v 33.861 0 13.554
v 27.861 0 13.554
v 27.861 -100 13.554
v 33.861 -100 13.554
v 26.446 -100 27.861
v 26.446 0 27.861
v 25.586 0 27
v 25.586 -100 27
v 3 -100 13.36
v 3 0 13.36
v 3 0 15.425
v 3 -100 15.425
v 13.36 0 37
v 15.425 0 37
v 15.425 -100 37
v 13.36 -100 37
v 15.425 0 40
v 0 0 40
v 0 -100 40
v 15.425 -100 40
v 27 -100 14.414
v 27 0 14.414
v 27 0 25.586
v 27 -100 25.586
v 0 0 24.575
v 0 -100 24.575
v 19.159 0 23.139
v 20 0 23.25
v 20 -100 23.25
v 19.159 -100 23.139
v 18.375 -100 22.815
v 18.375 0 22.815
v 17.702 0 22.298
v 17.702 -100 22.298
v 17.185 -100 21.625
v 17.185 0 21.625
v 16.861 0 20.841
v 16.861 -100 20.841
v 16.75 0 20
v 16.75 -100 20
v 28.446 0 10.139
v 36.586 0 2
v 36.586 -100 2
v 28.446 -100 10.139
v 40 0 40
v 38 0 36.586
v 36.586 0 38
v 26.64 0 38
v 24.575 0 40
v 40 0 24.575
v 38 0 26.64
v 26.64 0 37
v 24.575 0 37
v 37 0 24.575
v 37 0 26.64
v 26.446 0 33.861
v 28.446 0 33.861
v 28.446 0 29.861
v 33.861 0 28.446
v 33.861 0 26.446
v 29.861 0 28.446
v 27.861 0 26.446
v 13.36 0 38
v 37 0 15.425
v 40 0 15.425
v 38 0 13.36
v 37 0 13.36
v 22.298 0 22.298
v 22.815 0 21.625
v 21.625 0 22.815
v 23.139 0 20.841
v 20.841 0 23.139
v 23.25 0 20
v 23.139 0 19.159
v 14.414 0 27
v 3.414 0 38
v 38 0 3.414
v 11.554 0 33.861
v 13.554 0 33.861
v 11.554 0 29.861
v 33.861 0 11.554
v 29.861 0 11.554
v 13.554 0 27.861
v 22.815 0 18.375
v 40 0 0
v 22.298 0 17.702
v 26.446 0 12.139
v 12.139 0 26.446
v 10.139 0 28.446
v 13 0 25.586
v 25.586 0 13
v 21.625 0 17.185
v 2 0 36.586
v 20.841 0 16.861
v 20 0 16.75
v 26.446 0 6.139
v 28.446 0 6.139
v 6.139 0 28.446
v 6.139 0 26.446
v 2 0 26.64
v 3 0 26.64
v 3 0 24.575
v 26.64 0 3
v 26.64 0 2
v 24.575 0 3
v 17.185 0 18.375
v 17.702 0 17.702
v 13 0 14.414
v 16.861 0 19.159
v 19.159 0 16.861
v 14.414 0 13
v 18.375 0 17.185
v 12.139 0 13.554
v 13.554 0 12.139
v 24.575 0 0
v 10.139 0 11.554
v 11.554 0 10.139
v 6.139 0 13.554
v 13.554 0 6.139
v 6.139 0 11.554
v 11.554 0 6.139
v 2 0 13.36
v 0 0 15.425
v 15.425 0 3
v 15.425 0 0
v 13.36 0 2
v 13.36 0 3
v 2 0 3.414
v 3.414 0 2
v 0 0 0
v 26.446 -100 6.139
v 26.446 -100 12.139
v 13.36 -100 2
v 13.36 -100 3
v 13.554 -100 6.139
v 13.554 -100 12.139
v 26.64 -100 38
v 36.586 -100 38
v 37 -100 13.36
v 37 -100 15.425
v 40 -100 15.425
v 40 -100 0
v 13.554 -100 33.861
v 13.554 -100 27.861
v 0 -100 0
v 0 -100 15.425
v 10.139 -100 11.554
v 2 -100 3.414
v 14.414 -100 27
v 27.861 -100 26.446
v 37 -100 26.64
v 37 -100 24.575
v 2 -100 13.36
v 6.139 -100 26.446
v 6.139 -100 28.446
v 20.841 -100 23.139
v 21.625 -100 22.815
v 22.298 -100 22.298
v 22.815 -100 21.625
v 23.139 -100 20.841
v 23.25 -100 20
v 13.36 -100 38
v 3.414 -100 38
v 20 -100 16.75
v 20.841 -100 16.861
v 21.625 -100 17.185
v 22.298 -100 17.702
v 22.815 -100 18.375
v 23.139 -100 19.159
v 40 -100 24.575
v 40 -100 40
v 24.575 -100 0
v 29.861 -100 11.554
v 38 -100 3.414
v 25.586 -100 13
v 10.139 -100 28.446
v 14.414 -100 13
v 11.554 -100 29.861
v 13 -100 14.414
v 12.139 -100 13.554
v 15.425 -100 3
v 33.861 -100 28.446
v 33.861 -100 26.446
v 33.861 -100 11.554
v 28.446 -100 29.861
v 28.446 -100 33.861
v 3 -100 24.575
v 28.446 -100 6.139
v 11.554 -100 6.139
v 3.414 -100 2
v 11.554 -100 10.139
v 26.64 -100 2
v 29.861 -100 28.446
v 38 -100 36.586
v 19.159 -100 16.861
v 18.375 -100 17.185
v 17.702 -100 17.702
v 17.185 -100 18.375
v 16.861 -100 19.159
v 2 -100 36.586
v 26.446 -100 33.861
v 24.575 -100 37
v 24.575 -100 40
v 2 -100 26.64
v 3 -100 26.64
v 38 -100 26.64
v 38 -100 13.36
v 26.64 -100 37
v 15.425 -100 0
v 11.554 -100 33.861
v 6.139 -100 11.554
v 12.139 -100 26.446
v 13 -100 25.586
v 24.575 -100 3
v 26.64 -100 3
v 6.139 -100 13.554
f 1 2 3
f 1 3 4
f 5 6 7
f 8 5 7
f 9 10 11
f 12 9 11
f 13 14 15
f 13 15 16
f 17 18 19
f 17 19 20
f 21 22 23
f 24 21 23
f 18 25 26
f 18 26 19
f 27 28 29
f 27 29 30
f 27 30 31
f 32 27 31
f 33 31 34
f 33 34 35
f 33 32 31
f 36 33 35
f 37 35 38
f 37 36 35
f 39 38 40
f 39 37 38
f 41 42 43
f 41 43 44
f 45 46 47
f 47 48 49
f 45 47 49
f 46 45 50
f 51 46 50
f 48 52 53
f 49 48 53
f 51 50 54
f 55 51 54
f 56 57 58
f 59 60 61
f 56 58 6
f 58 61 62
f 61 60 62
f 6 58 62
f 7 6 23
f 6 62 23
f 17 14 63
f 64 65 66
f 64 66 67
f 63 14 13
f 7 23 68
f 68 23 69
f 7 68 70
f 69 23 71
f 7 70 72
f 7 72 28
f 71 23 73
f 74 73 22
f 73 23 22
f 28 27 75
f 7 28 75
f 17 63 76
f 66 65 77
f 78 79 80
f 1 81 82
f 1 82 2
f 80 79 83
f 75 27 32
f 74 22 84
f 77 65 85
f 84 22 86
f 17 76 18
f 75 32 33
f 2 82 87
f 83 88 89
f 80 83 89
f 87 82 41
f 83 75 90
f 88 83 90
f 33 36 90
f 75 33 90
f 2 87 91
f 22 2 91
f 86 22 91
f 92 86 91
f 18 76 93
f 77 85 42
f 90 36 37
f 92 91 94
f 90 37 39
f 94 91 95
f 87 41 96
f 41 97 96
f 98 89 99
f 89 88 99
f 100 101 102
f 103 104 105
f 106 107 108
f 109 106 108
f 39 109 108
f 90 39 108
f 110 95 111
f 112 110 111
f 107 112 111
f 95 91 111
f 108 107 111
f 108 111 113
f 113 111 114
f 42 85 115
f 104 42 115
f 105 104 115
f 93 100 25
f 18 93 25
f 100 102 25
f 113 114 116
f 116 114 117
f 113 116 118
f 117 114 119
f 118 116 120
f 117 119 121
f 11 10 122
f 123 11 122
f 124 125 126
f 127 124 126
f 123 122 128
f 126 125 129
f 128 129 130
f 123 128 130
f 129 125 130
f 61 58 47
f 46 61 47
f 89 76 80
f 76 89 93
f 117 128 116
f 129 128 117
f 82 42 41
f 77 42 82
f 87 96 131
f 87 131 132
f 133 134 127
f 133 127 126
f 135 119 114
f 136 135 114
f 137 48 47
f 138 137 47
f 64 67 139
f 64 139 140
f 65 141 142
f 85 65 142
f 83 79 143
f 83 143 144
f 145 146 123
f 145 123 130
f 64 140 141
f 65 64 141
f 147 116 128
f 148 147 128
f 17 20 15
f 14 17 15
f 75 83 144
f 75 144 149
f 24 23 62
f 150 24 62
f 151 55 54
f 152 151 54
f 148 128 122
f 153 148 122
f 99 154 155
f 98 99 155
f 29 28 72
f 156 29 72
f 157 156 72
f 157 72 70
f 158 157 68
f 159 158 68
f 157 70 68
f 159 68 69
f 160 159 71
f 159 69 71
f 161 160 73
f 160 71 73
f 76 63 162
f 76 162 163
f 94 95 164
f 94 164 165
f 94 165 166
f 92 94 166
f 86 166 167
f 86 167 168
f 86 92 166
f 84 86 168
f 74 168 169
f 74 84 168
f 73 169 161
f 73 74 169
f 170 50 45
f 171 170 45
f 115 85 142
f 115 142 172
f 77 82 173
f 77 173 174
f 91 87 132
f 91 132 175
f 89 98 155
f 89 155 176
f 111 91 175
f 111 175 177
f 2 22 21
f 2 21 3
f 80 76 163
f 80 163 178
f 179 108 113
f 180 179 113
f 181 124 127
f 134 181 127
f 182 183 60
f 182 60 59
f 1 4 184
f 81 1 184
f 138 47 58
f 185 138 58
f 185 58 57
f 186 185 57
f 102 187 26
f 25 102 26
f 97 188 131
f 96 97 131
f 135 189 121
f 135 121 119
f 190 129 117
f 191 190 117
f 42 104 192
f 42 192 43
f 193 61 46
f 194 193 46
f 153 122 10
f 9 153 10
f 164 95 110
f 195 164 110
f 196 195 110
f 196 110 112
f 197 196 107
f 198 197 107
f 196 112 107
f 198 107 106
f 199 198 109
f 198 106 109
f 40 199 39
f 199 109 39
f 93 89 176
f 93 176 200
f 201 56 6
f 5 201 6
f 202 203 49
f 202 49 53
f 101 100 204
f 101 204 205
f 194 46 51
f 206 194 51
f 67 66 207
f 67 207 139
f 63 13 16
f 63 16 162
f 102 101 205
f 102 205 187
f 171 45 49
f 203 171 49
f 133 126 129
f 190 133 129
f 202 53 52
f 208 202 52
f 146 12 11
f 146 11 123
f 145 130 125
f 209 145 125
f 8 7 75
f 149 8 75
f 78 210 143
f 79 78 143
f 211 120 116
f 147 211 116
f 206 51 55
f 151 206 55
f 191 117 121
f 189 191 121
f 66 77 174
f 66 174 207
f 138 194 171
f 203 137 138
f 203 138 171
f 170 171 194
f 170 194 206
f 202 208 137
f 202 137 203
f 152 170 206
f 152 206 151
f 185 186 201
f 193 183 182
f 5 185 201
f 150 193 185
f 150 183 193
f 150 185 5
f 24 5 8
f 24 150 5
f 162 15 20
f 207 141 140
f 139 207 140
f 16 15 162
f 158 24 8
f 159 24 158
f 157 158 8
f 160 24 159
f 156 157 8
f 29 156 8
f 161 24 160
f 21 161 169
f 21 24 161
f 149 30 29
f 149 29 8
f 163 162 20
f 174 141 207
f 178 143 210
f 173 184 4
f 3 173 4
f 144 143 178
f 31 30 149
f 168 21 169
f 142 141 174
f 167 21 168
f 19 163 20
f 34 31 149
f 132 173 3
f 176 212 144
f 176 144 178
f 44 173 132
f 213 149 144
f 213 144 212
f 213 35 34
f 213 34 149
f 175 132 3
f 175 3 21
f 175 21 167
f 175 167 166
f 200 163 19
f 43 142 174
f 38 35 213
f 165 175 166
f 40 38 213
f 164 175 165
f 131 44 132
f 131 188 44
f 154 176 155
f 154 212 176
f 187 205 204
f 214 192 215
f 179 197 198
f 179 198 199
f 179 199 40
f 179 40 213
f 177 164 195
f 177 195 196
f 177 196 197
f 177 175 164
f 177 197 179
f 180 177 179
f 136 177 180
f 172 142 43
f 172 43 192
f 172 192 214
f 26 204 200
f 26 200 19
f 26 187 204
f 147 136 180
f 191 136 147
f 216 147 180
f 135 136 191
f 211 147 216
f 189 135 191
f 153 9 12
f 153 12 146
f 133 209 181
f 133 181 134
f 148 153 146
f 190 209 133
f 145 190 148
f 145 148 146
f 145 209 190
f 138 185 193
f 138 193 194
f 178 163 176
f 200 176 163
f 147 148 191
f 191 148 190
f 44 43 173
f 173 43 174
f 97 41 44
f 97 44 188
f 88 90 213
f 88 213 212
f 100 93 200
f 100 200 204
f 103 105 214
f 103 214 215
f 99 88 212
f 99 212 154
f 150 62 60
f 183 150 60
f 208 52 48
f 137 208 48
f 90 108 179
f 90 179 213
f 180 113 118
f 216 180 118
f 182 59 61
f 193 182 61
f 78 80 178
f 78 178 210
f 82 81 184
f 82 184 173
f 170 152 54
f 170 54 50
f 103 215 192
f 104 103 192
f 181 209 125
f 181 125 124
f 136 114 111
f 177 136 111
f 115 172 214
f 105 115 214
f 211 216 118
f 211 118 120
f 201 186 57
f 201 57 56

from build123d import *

# Parameters (mm, degrees)
F1_DEPTH = 100


with BuildPart() as f1:
    # F0 (on Front) → F1 (new body)
    with BuildSketch(Plane.XZ):
        with BuildLine():
            Line((0, 15.425), (0, 0))
            Line((0, 0), (15.425, 0))
            Line((15.425, 0), (15.425, 3))
            Line((15.425, 3), (13.36, 3))
            Line((13.36, 3), (13.36, 2))
            Line((13.36, 2), (3.414214, 2))
            Line((3.414214, 2), (11.553662, 10.139449))
            Line((11.553662, 10.139449), (11.553662, 6.139449))
            Line((11.553662, 6.139449), (13.553662, 6.139449))
            Line((13.553662, 6.139449), (13.553662, 12.139449))
            Line((13.553662, 12.139449), (14.414214, 13))
            Line((14.414214, 13), (20, 13))
            Line((20, 13), (20, 16.75))
            ThreePointArc((20, 16.75), (17.701903, 17.701903), (16.75, 20))
            Line((16.75, 20), (13, 20))
            Line((13, 20), (13, 14.414214))
            Line((13, 14.414214), (12.139449, 13.553662))
            Line((12.139449, 13.553662), (6.139449, 13.553662))
            Line((6.139449, 13.553662), (6.139449, 11.553662))
            Line((6.139449, 11.553662), (10.139449, 11.553662))
            Line((10.139449, 11.553662), (2, 3.414214))
            Line((2, 3.414214), (2, 13.36))
            Line((2, 13.36), (3, 13.36))
            Line((3, 13.36), (3, 15.425))
            Line((3, 15.425), (0, 15.425))
        make_face()
    extrude(amount=F1_DEPTH)

    # F2: F1 across face


with BuildPart() as f1_1:
    add(f1.part)
    add(f1.part.mirror(Plane(origin=(20, -50, 14.875), x_dir=(0, 1, 0), z_dir=(1, 0, 0))))

    # F3: F1 across face


with BuildPart() as f1_2:
    add(f1_1.part)
    add(f1_1.part.mirror(Plane(origin=(14.875, -50, 20), x_dir=(1, 0, 0), z_dir=(0, 0, 1))))


solid = f1_2.part
